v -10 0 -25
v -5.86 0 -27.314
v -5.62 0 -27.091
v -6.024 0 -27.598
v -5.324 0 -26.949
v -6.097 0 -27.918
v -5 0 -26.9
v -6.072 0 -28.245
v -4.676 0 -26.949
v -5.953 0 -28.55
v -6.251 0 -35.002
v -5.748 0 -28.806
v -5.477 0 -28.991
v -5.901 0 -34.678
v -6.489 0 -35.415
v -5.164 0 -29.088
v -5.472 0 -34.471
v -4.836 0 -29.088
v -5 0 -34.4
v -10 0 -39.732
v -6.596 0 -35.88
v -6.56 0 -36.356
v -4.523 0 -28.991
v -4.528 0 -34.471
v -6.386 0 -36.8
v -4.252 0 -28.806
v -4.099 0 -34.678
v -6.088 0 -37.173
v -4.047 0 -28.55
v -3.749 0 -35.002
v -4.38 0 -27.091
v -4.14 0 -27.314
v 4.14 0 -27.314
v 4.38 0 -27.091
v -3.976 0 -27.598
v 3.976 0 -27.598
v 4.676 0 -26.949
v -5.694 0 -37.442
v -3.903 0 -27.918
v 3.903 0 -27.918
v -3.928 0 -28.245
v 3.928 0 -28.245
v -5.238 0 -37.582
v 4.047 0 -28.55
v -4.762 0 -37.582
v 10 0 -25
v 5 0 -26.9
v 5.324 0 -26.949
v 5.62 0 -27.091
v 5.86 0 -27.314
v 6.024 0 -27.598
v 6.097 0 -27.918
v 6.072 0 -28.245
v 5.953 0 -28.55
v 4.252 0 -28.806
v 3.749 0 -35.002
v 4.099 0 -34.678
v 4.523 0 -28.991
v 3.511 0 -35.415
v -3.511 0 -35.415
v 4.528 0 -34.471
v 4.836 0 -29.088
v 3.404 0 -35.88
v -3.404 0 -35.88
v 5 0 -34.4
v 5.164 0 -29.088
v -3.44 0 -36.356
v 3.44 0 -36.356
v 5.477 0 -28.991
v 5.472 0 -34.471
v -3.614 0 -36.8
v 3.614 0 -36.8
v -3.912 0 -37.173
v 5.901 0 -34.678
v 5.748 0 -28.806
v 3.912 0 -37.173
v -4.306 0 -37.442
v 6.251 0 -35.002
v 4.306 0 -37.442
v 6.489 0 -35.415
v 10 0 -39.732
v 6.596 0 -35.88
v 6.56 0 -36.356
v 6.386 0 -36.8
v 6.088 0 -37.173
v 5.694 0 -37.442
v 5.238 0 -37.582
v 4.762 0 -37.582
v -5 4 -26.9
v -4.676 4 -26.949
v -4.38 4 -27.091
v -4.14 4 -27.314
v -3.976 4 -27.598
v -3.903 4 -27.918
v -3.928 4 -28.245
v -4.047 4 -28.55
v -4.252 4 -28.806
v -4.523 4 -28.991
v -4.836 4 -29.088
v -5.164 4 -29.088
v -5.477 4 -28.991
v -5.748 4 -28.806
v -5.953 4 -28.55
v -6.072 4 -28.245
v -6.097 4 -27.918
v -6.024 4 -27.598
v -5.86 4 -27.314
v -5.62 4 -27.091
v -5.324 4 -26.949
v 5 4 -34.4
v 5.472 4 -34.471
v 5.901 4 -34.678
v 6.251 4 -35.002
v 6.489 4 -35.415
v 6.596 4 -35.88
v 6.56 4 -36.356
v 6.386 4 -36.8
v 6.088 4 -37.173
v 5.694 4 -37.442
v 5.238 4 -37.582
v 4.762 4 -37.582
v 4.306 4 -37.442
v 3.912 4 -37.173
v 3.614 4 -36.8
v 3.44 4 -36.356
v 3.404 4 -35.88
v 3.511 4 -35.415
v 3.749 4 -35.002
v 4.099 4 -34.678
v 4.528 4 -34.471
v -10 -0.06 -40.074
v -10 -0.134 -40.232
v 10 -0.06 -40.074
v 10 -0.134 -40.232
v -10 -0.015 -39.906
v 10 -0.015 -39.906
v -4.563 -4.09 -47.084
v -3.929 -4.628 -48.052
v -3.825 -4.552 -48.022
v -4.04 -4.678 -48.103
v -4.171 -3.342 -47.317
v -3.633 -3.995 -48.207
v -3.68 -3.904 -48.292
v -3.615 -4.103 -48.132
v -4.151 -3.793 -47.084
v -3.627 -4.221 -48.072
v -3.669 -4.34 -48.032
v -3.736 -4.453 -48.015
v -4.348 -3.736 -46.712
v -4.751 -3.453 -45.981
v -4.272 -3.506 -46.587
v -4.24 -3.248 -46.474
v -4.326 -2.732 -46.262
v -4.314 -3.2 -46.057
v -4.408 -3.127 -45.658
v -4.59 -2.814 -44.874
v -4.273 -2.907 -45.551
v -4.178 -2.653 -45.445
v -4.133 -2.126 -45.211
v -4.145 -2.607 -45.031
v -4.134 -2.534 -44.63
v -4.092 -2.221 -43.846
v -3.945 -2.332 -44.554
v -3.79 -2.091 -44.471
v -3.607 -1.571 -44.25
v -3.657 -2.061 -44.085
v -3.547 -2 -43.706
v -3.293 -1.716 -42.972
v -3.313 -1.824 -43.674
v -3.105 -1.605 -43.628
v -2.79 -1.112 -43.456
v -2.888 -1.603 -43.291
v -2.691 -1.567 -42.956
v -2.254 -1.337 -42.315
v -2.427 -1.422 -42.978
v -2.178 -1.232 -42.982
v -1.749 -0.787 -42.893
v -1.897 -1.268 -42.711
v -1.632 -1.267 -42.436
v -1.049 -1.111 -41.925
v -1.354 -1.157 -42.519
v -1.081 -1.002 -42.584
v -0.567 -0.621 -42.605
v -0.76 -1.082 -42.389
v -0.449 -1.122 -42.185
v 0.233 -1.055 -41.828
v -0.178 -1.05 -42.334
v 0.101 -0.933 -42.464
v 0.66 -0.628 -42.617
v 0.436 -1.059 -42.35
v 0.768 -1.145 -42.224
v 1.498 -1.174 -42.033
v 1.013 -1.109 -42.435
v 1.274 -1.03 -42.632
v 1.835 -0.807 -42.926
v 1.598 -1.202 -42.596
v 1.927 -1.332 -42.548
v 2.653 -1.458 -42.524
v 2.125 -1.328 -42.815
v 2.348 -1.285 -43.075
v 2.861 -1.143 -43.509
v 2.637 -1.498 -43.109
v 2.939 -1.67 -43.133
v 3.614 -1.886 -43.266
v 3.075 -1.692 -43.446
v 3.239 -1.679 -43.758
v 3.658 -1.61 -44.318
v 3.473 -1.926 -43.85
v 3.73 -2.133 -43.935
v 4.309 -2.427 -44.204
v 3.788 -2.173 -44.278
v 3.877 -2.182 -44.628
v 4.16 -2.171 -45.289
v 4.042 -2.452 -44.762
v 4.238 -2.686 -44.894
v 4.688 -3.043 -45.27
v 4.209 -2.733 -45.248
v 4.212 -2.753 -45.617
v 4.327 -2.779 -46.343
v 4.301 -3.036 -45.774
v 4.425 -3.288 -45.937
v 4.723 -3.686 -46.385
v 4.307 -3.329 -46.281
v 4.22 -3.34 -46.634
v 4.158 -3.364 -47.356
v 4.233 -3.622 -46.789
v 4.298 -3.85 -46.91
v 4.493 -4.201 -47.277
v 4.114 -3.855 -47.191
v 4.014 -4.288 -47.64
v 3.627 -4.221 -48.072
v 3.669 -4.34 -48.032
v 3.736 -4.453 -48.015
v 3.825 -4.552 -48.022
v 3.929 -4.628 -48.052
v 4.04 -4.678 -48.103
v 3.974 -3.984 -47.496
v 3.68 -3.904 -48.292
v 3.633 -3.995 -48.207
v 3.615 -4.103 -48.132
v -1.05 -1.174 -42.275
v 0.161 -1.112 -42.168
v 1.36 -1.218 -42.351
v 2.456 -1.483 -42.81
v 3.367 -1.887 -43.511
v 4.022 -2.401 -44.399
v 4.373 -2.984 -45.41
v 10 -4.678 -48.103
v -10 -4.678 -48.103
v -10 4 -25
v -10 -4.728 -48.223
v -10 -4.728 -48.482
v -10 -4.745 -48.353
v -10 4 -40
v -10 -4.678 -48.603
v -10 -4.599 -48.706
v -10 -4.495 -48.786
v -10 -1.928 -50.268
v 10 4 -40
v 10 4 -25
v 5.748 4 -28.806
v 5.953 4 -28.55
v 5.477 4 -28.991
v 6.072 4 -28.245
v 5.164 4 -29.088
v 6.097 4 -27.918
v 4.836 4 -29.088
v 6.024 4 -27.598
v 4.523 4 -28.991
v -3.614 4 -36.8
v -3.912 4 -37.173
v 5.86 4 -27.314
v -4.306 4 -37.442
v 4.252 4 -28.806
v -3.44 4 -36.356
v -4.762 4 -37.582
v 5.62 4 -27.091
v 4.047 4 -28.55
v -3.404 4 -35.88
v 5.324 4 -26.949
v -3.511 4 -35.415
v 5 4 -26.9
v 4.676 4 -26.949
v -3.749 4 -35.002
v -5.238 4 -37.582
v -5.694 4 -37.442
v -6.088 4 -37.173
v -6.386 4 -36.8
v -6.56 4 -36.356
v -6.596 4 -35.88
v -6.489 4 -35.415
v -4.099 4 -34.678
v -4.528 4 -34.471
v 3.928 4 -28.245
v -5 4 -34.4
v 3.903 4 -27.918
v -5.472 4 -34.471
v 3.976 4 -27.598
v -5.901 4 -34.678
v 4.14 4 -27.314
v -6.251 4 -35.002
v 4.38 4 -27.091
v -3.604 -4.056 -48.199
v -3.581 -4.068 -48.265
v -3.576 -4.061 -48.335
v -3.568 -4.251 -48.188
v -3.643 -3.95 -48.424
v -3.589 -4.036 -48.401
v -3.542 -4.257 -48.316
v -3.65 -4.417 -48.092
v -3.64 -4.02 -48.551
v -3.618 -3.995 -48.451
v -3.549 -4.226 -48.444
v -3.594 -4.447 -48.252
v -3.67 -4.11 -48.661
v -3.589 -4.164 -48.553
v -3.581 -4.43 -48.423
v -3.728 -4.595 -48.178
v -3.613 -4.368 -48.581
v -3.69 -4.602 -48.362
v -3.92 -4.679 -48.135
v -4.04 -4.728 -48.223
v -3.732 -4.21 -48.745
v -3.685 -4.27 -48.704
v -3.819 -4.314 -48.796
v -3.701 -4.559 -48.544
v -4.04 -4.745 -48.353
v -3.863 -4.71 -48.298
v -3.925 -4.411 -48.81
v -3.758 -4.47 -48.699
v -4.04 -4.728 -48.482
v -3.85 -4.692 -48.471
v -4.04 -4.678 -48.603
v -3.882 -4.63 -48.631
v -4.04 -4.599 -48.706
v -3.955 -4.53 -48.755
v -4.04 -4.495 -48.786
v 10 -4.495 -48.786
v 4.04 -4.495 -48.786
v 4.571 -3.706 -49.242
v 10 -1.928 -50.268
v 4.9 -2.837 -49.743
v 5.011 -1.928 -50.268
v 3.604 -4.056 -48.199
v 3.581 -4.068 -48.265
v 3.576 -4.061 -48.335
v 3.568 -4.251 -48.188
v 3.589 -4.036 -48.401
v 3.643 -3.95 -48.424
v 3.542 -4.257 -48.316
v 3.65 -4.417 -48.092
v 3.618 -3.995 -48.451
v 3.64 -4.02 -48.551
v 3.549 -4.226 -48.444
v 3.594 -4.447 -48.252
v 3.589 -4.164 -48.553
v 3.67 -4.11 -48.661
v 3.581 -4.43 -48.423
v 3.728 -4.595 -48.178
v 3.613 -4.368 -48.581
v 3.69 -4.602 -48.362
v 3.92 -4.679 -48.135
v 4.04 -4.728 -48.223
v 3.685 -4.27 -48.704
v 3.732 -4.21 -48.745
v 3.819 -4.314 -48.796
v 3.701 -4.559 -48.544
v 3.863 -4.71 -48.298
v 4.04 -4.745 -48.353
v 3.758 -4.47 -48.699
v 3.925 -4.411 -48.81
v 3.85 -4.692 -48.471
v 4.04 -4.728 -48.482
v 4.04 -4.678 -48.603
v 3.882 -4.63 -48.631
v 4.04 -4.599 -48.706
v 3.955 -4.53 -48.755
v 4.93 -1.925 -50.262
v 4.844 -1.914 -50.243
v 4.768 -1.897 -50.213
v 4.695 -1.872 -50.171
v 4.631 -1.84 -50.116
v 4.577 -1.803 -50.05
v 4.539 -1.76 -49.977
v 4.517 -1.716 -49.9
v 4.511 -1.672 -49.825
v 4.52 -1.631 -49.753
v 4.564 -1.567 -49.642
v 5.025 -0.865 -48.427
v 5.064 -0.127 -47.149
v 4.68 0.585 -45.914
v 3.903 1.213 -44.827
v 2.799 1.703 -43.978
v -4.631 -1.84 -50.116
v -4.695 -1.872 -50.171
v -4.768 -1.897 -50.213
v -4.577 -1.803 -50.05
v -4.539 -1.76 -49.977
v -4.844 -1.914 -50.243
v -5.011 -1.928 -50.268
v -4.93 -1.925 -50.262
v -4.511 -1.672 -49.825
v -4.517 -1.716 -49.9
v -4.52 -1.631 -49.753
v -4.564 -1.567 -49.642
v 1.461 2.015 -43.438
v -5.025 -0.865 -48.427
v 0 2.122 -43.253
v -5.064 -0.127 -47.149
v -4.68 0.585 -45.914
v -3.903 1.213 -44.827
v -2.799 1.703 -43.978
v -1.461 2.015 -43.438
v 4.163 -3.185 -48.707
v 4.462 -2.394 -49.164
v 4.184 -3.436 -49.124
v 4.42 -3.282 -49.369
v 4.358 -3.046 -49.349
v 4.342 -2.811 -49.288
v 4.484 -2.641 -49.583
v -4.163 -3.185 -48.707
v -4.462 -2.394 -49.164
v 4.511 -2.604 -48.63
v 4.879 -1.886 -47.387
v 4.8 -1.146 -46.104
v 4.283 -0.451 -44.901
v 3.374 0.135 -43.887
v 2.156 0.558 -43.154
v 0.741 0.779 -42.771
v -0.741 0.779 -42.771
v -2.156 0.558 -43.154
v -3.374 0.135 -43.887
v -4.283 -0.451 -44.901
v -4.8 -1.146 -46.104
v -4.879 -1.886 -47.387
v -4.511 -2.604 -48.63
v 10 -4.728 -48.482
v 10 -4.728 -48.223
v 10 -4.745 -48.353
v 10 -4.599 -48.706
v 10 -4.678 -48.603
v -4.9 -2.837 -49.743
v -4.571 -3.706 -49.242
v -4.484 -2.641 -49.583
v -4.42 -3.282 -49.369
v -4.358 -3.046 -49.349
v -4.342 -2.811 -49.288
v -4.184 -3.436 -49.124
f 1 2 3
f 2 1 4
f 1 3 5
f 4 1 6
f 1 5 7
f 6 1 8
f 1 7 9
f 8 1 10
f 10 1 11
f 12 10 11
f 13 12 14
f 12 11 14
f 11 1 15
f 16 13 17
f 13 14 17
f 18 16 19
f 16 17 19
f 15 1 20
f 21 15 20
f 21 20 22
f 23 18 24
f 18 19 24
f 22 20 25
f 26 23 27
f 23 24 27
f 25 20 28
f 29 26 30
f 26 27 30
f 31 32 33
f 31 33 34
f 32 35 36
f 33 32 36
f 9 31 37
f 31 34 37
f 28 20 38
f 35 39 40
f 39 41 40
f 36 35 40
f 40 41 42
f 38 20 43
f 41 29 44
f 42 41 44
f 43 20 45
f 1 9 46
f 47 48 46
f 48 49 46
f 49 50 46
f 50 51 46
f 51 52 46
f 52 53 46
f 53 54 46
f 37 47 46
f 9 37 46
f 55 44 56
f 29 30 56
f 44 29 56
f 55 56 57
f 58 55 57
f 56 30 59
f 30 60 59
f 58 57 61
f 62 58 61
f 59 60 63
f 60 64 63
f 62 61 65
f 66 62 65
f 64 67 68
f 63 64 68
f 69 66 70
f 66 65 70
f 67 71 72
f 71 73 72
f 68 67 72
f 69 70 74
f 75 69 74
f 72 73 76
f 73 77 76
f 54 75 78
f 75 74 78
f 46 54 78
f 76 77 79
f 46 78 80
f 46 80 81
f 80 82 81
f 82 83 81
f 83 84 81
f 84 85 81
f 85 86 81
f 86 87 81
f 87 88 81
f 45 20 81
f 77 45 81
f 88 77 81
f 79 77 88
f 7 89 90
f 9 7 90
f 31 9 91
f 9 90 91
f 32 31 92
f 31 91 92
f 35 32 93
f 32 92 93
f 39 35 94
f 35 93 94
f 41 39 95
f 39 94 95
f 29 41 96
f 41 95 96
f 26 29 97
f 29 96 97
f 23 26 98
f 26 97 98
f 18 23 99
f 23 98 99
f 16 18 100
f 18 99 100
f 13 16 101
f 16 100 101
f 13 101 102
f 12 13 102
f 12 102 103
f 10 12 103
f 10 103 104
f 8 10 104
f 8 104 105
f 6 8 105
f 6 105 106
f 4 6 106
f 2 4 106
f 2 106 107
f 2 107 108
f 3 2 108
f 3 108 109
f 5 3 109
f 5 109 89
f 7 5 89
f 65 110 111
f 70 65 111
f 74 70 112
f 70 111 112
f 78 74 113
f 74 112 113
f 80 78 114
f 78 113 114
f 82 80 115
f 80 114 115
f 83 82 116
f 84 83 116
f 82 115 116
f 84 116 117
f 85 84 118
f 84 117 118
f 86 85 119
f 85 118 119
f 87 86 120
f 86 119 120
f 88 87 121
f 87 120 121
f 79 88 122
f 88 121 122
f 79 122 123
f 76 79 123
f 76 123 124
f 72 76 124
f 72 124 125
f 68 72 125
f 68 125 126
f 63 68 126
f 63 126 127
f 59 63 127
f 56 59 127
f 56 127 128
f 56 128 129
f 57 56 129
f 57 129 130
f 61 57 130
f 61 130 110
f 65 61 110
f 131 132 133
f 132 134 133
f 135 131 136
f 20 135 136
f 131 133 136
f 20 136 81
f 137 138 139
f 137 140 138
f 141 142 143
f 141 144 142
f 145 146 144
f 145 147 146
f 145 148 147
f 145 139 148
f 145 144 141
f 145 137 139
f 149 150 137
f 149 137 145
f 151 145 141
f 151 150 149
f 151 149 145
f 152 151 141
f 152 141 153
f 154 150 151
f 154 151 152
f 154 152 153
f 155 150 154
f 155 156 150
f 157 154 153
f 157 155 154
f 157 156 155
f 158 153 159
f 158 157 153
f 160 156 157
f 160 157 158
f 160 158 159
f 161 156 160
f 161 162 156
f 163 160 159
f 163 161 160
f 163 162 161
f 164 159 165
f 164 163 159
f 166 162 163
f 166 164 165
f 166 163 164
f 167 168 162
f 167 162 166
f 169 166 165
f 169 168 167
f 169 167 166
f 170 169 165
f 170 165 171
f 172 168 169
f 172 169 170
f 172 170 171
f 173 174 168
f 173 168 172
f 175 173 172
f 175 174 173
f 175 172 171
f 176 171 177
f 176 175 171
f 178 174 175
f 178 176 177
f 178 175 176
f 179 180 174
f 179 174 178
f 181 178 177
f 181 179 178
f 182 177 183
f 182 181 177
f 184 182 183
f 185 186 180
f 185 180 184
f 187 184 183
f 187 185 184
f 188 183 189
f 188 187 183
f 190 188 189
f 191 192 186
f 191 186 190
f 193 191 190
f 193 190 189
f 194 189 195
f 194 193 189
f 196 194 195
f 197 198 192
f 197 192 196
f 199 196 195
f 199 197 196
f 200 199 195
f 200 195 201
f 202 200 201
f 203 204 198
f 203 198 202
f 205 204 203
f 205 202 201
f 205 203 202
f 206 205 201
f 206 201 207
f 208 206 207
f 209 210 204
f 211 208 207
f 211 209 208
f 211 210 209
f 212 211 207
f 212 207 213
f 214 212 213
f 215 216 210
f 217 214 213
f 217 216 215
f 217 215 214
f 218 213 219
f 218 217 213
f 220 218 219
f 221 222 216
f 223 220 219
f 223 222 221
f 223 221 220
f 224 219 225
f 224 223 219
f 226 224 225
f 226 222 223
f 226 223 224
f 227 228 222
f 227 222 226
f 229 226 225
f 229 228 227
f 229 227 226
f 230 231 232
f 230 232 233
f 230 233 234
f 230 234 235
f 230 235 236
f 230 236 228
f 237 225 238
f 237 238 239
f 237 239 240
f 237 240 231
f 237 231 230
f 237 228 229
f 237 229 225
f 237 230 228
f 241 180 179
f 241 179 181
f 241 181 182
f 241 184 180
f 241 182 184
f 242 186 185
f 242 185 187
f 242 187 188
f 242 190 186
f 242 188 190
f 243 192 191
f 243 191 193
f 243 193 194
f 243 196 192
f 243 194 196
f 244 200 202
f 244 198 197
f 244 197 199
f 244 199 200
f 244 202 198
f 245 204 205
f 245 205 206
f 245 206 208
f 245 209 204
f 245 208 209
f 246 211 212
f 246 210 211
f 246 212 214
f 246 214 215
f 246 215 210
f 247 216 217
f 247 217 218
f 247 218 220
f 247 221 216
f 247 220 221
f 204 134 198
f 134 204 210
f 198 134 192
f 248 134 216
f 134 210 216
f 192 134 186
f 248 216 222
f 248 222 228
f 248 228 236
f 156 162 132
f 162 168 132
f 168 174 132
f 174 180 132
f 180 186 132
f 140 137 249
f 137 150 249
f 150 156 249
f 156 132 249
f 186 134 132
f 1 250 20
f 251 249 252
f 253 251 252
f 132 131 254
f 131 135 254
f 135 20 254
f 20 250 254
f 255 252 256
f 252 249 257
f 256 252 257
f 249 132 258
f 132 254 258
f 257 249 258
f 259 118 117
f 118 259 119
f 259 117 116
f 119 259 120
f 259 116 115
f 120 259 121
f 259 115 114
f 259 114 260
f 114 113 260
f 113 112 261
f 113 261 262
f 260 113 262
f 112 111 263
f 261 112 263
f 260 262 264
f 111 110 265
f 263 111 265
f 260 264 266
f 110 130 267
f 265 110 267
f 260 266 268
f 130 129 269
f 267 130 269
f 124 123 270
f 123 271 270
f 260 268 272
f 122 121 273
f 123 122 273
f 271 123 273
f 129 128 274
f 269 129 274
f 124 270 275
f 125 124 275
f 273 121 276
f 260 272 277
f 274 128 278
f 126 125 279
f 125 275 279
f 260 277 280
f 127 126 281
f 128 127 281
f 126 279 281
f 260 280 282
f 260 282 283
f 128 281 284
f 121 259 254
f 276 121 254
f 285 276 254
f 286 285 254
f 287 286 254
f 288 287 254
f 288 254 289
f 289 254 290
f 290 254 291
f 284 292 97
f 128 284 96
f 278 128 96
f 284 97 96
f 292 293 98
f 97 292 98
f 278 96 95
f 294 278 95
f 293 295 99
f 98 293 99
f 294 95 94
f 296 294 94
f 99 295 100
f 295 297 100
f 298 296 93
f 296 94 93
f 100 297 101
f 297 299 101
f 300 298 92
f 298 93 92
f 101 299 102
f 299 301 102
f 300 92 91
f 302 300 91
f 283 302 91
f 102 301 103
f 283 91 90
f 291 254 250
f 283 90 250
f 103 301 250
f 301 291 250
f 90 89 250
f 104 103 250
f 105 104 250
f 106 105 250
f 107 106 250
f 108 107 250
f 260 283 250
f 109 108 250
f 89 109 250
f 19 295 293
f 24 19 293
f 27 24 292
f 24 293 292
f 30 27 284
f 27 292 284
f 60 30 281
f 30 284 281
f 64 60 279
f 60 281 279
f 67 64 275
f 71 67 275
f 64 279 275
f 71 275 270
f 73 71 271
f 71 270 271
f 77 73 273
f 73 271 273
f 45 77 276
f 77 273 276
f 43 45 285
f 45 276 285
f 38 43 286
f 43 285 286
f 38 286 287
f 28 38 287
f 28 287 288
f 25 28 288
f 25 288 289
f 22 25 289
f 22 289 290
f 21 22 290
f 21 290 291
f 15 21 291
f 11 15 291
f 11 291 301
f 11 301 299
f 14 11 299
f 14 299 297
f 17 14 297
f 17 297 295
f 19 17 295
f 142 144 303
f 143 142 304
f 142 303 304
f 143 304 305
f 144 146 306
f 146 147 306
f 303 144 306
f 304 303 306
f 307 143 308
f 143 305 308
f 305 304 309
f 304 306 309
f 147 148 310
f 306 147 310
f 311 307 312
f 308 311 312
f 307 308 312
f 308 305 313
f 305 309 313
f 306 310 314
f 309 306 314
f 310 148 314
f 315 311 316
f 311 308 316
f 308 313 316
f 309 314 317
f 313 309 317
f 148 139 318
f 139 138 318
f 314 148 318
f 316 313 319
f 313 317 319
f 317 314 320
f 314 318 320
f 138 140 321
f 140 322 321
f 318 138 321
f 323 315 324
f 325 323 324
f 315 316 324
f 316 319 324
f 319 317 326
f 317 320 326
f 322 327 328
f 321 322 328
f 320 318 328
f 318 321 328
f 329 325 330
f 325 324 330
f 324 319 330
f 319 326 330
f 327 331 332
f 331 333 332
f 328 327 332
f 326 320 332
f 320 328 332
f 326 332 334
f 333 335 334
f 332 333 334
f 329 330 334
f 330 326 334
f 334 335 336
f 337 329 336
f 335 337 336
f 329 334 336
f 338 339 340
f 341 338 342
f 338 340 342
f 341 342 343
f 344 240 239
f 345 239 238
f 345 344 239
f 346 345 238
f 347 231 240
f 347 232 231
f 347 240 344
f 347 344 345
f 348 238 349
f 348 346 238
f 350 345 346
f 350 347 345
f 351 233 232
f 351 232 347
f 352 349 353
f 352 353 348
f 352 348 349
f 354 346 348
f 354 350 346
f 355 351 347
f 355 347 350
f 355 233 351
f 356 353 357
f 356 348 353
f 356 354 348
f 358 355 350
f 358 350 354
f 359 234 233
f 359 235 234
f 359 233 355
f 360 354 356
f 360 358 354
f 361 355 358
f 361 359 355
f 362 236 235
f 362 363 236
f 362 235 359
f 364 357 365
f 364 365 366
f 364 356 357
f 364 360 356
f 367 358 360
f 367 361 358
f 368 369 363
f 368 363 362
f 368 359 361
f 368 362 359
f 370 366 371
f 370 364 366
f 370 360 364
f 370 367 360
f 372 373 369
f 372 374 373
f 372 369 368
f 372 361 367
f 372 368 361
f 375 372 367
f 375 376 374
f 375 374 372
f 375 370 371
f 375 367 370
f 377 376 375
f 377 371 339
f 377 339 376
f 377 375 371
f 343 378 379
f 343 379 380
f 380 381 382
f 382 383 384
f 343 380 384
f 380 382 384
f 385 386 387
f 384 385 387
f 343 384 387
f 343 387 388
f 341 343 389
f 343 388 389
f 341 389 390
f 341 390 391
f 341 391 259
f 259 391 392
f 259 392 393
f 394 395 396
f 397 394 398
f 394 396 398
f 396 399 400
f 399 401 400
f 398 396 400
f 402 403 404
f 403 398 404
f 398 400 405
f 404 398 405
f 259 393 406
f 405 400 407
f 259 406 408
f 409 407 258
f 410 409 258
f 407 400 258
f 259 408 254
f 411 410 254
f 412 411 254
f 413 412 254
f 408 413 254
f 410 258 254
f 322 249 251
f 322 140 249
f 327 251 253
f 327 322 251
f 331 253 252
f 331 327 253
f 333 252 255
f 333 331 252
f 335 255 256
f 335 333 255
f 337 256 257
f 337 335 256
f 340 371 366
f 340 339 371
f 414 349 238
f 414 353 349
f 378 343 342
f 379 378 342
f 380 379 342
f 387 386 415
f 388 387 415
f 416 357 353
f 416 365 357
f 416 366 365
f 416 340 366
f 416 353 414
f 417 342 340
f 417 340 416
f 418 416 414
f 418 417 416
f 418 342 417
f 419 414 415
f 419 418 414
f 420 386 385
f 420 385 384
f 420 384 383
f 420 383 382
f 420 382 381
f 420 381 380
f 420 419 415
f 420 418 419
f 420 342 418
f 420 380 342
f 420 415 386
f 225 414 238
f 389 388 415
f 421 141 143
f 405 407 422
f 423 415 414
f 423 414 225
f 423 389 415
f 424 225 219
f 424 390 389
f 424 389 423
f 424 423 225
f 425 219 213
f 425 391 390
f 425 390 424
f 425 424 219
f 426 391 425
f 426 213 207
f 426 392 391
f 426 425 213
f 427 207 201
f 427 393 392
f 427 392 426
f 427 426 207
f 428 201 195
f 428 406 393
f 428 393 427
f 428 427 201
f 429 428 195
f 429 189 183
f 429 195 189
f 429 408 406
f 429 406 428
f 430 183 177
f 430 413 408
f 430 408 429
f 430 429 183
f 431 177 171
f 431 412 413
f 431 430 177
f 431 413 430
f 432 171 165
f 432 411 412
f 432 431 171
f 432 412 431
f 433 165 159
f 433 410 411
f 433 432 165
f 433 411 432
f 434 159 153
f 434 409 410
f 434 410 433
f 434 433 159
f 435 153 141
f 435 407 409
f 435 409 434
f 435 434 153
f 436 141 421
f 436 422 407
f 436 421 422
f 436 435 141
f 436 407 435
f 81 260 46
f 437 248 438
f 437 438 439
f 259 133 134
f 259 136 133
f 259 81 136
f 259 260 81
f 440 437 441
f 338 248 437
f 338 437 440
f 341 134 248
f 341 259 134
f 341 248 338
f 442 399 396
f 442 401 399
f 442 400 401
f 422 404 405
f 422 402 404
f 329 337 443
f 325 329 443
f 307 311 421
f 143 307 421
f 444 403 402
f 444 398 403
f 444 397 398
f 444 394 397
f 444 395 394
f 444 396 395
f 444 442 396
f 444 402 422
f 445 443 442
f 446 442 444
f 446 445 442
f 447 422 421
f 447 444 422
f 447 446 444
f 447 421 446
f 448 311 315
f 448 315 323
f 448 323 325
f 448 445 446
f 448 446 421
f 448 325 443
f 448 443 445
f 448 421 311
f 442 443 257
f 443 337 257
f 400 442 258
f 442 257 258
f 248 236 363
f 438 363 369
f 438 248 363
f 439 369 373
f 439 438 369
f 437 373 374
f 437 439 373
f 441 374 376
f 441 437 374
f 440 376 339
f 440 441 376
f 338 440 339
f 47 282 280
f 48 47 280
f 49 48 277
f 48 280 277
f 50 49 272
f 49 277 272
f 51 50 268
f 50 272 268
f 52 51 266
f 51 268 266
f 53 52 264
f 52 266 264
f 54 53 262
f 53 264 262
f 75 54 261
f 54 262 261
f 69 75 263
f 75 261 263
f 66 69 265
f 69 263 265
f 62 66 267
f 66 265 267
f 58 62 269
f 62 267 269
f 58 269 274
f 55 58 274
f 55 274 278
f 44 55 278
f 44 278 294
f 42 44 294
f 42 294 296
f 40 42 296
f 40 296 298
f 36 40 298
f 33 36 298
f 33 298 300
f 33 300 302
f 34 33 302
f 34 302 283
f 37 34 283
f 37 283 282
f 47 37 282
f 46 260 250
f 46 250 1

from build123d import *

# Parameters (mm, degrees)
SKETCH_1_R               = 5
EXTRUDE_1_DEPTH          = 8
EXTRUDE_2_DEPTH          = 10
EXTRUDE_2_DEPTH_BACK     = 10
FILLET_1_R               = 0.5
SKETCH_6_R               = 1.6
SKETCH_6_R_2             = 1.1
CUT_EXTRUDE_1_DEPTH      = 67.938579217
CUT_EXTRUDE_2_DEPTH      = 67.199195672
CUT_EXTRUDE_2_DEPTH_BACK = 67.199195672
CUT_EXTRUDE_3_DEPTH      = 55.878761072
FILLET_2_R               = 1


with BuildPart() as part:
    # 草图1 → 凸台-拉伸1 (new body)
    with BuildSketch(Plane(origin=(0, 0, 0), x_dir=(1, 0, 0), z_dir=(0, 1, 0))):
        Polygon((11.547005384, 40), (-11.547005384, 40), (-40.414518843, -10), (-28.867513459, -30), (28.867513459, -30), (40.414518843, -10), align=None)
        Circle(SKETCH_1_R, mode=Mode.SUBTRACT)
    extrude(amount=EXTRUDE_1_DEPTH)

    # 草图2 → 凸台-拉伸2 (add, two sides: drawn at the far end of the back side and taken through both)
    with BuildSketch(Plane(origin=(0, 0, 0), x_dir=(0, 0, -1), z_dir=(1, 0, 0)).offset(-EXTRUDE_2_DEPTH_BACK)):
        Polygon((40, 8), (40, 0), (48.535898385, -4.92820323), (52, 1.07179677), align=None)
    extrude(amount=EXTRUDE_2_DEPTH + EXTRUDE_2_DEPTH_BACK)

    # 草图4 → 切除-旋转1 (revolve, cut)
    with BuildSketch(Plane(origin=(0, 0, 0), x_dir=(0, 0, -1), z_dir=(1, 0, 0))):
        with BuildLine():
            Line((50.219872981, 3.988526329), (45.119872981, -4.84493279))
            ThreePointArc((45.119872981, -4.84493279), (52.08660254, -2.97820323), (50.219872981, 3.988526329))
        make_face()
    revolve(axis=Axis((0, 2.57179677, -49.401923789), (0, -0.8660254037844388, 0.4999999999999997)), mode=Mode.SUBTRACT)

    # 圆角1
    fillet_1_edges = [part.edges().sort_by_distance(p)[0] for p in [
        (6.119151464, -4.92820323, -48.535898385),
        (-6.119151464, -4.92820323, -48.535898385),
        (-6.119151464, 1.07179677, -52),
        (-4.124318125, -1.92820323, -50.267949192),
        (0, -1.556706503, -42.696294756),
        (4.124318125, -1.92820323, -50.267949192),
        (0, 4.443293497, -46.160396371),
        (6.119151464, 1.07179677, -52),
    ]]
    fillet(fillet_1_edges, radius=FILLET_1_R)

    # 草图6 → 切除-拉伸1 (cut, through all)
    with BuildSketch(Plane(origin=(0, 8, 0), x_dir=(1, 0, 0), z_dir=(0, 1, 0))):
        with Locations((-5, 36)):
            Circle(SKETCH_6_R)
        with Locations((5, 36)):
            Circle(SKETCH_6_R)
        with Locations((-5, 28)):
            Circle(SKETCH_6_R_2)
        with Locations((5, 28)):
            Circle(SKETCH_6_R_2)
    extrude(amount=-CUT_EXTRUDE_1_DEPTH, mode=Mode.SUBTRACT)

    # 草图7 → 切除-拉伸2 (cut, two sides: drawn at the far end of the back side and taken through both)
    with BuildSketch(Plane(origin=(0, 0, 0), x_dir=(0, 0, -1), z_dir=(1, 0, 0)).offset(-CUT_EXTRUDE_2_DEPTH_BACK)):
        Polygon((50.267949192, -1.92820323), (40, 4), (25, 4), (25, 0), (-30, 0), (-30, 8), (40, 8), (51.566987298, 1.32179677), (52, 1.07179677), (51.75, 0.638784068), align=None)
    extrude(amount=CUT_EXTRUDE_2_DEPTH + CUT_EXTRUDE_2_DEPTH_BACK, mode=Mode.SUBTRACT)

    # 草图8 → 切除-拉伸3 (cut, through all)
    with BuildSketch(Plane(origin=(0, 4, 0), x_dir=(1, 0, 0), z_dir=(0, 1, 0))):
        Polygon((-10, 40), (-11.547005384, 40), (-20.207259422, 25), (-10, 25), align=None)
        Polygon((10, 40), (11.547005384, 40), (20.207259422, 25), (10, 25), align=None)
    extrude(amount=-CUT_EXTRUDE_3_DEPTH, mode=Mode.SUBTRACT)

    # 圆角2
    fillet_2_edges = [part.edges().sort_by_distance(p)[0] for p in [
        (0, 0, -40),
    ]]
    fillet(fillet_2_edges, radius=FILLET_2_R)


solid = part.part
